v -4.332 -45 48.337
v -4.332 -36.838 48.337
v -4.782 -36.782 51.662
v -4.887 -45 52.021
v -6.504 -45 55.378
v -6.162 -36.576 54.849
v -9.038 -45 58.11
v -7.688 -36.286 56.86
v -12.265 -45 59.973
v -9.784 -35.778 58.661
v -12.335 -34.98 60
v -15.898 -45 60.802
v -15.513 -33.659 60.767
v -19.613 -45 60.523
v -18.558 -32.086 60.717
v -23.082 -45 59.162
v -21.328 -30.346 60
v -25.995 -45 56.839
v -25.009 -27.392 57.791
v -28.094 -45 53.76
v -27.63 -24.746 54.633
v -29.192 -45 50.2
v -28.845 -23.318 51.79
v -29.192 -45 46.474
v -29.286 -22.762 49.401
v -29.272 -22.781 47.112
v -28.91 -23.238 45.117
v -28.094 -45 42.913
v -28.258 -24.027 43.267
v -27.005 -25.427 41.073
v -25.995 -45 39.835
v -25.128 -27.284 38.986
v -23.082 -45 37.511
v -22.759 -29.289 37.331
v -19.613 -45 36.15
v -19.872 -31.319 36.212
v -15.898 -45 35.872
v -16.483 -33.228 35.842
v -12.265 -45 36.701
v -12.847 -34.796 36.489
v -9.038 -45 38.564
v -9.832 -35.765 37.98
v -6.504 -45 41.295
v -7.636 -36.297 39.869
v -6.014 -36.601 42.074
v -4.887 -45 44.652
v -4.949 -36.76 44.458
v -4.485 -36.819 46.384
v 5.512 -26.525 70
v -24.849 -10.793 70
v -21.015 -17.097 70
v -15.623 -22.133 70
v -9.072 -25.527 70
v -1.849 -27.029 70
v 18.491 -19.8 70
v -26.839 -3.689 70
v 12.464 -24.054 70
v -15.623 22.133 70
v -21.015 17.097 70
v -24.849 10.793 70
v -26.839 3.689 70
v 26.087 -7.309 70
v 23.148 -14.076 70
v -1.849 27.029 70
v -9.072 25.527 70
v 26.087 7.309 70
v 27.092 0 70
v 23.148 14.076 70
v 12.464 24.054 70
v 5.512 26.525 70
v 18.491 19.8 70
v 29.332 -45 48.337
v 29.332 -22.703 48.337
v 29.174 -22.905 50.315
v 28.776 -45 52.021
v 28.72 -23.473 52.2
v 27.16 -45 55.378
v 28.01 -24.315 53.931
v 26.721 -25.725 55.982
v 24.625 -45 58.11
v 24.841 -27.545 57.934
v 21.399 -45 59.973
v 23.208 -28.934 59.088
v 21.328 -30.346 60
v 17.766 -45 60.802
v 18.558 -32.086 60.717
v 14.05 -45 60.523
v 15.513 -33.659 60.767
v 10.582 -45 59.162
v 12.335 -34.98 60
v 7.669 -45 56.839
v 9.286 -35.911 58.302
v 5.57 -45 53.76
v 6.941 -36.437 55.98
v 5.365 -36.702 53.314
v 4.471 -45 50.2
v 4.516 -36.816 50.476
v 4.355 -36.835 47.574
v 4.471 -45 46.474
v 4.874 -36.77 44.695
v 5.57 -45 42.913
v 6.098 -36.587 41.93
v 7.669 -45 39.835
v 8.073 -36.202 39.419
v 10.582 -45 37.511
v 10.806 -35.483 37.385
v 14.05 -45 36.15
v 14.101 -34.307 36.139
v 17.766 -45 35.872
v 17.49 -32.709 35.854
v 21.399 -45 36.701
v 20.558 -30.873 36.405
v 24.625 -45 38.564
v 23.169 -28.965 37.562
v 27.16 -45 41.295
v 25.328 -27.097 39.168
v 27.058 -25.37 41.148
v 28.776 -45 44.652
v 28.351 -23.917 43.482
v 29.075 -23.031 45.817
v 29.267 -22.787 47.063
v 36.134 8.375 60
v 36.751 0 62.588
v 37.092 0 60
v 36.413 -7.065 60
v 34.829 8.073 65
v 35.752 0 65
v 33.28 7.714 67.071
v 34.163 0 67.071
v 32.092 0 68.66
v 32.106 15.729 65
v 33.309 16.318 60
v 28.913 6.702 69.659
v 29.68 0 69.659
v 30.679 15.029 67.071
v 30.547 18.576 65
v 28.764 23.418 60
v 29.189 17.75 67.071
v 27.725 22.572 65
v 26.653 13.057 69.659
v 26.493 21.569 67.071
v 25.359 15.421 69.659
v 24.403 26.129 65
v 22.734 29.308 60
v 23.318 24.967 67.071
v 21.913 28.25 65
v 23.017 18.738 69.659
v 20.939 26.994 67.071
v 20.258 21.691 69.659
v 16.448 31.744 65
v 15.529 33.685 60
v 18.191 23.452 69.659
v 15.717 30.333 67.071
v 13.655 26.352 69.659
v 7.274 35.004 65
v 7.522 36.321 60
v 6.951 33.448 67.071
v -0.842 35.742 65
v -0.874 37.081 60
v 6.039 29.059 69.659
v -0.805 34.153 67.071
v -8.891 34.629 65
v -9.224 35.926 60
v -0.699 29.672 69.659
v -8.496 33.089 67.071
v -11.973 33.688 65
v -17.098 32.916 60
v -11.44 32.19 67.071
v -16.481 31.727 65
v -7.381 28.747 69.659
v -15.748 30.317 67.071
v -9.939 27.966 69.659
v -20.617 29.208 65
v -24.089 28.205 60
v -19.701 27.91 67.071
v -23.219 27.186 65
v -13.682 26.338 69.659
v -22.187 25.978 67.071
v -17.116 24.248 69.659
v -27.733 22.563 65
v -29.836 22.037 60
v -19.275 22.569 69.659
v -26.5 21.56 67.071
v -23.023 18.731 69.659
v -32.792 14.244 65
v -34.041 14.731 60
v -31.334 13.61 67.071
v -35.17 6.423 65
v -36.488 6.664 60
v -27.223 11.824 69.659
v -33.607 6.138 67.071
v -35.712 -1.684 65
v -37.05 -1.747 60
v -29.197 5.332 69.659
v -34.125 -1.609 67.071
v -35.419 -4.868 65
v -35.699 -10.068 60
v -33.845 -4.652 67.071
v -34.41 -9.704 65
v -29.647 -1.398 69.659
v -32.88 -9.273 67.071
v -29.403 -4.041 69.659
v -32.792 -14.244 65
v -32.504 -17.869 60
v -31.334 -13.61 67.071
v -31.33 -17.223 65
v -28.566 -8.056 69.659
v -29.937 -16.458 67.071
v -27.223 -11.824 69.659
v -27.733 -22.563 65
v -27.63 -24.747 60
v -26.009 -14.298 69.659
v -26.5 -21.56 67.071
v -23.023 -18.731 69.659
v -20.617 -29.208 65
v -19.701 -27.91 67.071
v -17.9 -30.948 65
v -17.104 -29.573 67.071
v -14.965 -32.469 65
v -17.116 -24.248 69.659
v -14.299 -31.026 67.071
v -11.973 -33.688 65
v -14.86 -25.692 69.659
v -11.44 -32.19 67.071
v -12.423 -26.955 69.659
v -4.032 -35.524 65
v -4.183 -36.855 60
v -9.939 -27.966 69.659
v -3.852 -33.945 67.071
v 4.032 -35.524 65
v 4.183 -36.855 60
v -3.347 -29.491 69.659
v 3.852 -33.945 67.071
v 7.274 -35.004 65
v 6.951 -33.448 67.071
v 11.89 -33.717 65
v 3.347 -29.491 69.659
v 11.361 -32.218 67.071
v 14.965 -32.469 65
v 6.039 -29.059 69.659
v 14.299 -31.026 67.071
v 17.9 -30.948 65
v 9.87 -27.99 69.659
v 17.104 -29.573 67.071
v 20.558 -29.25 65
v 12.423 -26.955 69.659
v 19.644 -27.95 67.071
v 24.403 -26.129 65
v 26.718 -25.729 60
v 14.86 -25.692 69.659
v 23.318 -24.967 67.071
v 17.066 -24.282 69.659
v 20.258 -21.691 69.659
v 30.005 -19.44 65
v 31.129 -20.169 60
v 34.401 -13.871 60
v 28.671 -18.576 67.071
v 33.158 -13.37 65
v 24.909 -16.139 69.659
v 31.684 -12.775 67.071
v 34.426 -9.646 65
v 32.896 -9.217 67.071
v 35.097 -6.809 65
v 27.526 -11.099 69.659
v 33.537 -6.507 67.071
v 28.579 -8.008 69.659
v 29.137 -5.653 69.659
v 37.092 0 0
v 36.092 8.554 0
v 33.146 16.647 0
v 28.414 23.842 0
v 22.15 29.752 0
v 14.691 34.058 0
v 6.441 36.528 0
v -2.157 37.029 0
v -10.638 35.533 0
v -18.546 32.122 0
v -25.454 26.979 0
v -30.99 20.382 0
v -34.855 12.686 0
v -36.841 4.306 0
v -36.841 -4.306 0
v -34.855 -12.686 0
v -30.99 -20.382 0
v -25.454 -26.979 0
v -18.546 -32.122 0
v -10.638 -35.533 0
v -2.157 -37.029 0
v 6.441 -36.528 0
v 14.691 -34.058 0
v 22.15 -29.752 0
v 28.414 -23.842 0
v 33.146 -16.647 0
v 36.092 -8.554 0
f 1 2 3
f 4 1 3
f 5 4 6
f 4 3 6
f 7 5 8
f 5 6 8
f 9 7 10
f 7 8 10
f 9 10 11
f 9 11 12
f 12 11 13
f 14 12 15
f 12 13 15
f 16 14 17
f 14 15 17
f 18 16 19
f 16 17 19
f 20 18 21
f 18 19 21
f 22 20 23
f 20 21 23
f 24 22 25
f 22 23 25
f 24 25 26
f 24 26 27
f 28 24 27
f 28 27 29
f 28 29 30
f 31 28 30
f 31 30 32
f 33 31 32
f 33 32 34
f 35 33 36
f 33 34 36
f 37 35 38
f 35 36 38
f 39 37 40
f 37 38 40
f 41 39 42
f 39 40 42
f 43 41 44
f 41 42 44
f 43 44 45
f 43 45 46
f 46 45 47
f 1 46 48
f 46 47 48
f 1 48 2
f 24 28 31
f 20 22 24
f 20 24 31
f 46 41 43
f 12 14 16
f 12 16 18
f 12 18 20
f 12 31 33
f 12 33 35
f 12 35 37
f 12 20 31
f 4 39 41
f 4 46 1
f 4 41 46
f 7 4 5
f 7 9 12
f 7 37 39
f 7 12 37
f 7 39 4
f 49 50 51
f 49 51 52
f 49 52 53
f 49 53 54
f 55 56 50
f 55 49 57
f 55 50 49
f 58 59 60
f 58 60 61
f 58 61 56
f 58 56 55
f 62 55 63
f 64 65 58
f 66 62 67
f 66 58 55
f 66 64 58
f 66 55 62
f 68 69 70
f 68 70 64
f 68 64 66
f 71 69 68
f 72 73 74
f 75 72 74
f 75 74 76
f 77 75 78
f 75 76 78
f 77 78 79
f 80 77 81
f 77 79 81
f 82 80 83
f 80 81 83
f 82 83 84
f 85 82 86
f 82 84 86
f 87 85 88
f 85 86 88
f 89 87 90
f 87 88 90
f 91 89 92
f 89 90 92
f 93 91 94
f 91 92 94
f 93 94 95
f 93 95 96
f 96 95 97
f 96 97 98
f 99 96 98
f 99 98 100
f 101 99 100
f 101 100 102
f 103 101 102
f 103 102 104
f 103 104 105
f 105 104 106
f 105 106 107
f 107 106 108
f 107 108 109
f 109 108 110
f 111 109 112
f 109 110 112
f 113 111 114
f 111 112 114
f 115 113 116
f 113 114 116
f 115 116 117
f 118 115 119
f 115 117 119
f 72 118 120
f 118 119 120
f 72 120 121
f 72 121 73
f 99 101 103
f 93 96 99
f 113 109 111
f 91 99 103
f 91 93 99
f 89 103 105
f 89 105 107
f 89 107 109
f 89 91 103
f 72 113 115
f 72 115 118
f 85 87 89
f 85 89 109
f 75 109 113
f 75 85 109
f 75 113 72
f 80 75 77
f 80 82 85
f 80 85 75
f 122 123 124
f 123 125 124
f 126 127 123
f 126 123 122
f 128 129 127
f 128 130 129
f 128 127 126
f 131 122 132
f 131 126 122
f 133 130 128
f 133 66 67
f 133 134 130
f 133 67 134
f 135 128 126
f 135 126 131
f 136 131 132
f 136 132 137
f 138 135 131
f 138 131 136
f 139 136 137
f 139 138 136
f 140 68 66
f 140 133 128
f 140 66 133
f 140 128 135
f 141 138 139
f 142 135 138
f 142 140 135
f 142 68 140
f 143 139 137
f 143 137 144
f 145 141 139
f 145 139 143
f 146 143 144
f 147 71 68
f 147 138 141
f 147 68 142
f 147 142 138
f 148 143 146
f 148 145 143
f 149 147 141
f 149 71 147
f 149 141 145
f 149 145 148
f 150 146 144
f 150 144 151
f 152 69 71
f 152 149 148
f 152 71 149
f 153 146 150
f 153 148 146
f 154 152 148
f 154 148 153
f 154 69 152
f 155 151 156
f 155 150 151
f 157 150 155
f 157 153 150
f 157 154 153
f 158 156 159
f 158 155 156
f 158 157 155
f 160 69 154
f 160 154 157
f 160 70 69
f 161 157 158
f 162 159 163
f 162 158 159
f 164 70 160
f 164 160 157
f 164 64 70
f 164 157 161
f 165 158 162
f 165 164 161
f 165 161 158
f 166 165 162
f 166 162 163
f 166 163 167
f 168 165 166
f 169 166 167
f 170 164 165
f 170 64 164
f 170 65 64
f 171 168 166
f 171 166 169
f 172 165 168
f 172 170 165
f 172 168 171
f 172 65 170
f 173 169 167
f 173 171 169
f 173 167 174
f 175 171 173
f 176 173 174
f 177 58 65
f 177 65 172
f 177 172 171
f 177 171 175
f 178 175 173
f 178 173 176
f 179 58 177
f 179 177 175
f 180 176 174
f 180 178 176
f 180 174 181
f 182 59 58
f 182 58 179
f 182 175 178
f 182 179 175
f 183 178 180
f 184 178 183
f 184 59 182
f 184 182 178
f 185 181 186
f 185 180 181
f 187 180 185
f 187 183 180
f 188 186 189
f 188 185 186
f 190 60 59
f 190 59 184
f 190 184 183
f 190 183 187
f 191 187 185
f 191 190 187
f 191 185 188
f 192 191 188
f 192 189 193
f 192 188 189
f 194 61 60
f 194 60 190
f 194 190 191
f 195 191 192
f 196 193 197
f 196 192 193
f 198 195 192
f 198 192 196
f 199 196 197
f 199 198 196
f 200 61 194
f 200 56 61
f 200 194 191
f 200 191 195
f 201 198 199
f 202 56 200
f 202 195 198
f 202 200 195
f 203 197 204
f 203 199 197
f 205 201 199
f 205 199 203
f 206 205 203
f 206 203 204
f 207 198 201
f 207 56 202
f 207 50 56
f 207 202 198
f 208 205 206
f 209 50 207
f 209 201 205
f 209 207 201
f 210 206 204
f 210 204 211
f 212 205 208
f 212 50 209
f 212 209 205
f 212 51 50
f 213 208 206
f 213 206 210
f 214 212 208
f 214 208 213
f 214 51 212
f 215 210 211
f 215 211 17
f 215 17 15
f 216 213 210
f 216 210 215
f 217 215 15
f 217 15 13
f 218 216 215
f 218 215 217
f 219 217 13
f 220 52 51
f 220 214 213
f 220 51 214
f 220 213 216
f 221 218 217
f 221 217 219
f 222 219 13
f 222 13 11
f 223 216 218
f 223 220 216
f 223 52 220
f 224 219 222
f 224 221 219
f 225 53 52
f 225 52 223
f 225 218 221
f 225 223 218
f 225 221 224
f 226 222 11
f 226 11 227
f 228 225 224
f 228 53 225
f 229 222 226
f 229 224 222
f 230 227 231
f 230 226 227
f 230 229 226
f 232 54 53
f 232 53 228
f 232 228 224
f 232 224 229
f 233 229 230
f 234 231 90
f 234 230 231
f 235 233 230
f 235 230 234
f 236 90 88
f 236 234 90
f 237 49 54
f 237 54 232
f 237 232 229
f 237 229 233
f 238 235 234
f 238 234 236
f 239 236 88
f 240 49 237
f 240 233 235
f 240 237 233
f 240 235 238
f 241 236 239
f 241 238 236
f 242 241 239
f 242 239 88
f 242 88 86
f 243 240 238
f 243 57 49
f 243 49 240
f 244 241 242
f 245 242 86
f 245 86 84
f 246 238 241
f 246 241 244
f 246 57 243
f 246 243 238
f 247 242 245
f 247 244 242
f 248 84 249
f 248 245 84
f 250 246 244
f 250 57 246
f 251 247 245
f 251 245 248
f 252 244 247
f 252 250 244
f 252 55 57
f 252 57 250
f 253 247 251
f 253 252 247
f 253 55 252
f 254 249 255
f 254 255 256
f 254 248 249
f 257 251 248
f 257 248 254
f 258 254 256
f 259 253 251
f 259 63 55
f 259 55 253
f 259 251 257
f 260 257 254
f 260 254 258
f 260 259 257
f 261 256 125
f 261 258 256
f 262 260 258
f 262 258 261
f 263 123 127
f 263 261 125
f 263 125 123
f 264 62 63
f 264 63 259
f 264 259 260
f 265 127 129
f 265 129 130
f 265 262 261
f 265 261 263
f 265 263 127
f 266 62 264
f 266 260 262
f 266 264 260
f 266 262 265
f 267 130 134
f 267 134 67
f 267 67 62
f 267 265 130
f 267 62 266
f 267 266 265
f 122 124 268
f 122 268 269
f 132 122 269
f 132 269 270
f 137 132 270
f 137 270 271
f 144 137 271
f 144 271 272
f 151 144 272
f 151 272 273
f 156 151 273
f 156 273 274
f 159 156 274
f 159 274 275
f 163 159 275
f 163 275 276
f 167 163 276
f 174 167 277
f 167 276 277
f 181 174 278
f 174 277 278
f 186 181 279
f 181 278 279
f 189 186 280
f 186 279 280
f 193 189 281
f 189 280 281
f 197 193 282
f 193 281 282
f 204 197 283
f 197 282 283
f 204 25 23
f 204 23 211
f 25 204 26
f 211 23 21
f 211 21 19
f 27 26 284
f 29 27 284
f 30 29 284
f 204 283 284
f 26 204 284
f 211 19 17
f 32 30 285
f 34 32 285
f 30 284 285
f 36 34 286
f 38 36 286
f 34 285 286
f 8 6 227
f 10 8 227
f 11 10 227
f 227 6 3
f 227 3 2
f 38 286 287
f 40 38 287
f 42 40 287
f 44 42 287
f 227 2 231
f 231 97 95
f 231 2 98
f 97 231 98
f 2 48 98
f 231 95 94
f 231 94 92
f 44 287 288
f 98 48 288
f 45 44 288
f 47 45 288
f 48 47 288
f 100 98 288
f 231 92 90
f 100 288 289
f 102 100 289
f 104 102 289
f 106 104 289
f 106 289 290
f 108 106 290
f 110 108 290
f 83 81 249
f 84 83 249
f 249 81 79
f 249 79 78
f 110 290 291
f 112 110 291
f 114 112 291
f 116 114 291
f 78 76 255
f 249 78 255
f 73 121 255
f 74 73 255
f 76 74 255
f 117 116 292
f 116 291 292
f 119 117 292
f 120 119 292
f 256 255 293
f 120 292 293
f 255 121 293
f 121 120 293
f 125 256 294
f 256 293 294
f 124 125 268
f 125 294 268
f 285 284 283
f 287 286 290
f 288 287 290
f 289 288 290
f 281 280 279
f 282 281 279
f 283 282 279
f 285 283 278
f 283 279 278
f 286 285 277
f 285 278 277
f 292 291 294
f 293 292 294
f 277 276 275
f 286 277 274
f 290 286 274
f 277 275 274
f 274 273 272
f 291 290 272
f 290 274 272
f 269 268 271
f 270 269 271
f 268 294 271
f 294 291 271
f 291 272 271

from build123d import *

# Parameters (mm, degrees)
F0_R     = 37.091659
F1_DEPTH = 70
F2_R     = 10
F3_R     = 12.5
F4_DEPTH = 45


with BuildPart() as f1:
    # F0 (on Top) → F1 (new body)
    with BuildSketch(Plane.XY):
        Circle(F0_R)
    extrude(amount=F1_DEPTH)

    # F2
    f2_edges = [f1.edges().sort_by_distance(p)[0] for p in [
        (-37.091659, 0, 70),
    ]]
    fillet(f2_edges, radius=F2_R)

    # F3 (on Front) → F4 (join)
    with BuildSketch(Plane.XZ):
        with Locations((-16.831745, 48.336694)):
            Circle(F3_R)
        with Locations((16.831745, 48.336694)):
            Circle(F3_R)
    extrude(amount=F4_DEPTH)


solid = f1.part
